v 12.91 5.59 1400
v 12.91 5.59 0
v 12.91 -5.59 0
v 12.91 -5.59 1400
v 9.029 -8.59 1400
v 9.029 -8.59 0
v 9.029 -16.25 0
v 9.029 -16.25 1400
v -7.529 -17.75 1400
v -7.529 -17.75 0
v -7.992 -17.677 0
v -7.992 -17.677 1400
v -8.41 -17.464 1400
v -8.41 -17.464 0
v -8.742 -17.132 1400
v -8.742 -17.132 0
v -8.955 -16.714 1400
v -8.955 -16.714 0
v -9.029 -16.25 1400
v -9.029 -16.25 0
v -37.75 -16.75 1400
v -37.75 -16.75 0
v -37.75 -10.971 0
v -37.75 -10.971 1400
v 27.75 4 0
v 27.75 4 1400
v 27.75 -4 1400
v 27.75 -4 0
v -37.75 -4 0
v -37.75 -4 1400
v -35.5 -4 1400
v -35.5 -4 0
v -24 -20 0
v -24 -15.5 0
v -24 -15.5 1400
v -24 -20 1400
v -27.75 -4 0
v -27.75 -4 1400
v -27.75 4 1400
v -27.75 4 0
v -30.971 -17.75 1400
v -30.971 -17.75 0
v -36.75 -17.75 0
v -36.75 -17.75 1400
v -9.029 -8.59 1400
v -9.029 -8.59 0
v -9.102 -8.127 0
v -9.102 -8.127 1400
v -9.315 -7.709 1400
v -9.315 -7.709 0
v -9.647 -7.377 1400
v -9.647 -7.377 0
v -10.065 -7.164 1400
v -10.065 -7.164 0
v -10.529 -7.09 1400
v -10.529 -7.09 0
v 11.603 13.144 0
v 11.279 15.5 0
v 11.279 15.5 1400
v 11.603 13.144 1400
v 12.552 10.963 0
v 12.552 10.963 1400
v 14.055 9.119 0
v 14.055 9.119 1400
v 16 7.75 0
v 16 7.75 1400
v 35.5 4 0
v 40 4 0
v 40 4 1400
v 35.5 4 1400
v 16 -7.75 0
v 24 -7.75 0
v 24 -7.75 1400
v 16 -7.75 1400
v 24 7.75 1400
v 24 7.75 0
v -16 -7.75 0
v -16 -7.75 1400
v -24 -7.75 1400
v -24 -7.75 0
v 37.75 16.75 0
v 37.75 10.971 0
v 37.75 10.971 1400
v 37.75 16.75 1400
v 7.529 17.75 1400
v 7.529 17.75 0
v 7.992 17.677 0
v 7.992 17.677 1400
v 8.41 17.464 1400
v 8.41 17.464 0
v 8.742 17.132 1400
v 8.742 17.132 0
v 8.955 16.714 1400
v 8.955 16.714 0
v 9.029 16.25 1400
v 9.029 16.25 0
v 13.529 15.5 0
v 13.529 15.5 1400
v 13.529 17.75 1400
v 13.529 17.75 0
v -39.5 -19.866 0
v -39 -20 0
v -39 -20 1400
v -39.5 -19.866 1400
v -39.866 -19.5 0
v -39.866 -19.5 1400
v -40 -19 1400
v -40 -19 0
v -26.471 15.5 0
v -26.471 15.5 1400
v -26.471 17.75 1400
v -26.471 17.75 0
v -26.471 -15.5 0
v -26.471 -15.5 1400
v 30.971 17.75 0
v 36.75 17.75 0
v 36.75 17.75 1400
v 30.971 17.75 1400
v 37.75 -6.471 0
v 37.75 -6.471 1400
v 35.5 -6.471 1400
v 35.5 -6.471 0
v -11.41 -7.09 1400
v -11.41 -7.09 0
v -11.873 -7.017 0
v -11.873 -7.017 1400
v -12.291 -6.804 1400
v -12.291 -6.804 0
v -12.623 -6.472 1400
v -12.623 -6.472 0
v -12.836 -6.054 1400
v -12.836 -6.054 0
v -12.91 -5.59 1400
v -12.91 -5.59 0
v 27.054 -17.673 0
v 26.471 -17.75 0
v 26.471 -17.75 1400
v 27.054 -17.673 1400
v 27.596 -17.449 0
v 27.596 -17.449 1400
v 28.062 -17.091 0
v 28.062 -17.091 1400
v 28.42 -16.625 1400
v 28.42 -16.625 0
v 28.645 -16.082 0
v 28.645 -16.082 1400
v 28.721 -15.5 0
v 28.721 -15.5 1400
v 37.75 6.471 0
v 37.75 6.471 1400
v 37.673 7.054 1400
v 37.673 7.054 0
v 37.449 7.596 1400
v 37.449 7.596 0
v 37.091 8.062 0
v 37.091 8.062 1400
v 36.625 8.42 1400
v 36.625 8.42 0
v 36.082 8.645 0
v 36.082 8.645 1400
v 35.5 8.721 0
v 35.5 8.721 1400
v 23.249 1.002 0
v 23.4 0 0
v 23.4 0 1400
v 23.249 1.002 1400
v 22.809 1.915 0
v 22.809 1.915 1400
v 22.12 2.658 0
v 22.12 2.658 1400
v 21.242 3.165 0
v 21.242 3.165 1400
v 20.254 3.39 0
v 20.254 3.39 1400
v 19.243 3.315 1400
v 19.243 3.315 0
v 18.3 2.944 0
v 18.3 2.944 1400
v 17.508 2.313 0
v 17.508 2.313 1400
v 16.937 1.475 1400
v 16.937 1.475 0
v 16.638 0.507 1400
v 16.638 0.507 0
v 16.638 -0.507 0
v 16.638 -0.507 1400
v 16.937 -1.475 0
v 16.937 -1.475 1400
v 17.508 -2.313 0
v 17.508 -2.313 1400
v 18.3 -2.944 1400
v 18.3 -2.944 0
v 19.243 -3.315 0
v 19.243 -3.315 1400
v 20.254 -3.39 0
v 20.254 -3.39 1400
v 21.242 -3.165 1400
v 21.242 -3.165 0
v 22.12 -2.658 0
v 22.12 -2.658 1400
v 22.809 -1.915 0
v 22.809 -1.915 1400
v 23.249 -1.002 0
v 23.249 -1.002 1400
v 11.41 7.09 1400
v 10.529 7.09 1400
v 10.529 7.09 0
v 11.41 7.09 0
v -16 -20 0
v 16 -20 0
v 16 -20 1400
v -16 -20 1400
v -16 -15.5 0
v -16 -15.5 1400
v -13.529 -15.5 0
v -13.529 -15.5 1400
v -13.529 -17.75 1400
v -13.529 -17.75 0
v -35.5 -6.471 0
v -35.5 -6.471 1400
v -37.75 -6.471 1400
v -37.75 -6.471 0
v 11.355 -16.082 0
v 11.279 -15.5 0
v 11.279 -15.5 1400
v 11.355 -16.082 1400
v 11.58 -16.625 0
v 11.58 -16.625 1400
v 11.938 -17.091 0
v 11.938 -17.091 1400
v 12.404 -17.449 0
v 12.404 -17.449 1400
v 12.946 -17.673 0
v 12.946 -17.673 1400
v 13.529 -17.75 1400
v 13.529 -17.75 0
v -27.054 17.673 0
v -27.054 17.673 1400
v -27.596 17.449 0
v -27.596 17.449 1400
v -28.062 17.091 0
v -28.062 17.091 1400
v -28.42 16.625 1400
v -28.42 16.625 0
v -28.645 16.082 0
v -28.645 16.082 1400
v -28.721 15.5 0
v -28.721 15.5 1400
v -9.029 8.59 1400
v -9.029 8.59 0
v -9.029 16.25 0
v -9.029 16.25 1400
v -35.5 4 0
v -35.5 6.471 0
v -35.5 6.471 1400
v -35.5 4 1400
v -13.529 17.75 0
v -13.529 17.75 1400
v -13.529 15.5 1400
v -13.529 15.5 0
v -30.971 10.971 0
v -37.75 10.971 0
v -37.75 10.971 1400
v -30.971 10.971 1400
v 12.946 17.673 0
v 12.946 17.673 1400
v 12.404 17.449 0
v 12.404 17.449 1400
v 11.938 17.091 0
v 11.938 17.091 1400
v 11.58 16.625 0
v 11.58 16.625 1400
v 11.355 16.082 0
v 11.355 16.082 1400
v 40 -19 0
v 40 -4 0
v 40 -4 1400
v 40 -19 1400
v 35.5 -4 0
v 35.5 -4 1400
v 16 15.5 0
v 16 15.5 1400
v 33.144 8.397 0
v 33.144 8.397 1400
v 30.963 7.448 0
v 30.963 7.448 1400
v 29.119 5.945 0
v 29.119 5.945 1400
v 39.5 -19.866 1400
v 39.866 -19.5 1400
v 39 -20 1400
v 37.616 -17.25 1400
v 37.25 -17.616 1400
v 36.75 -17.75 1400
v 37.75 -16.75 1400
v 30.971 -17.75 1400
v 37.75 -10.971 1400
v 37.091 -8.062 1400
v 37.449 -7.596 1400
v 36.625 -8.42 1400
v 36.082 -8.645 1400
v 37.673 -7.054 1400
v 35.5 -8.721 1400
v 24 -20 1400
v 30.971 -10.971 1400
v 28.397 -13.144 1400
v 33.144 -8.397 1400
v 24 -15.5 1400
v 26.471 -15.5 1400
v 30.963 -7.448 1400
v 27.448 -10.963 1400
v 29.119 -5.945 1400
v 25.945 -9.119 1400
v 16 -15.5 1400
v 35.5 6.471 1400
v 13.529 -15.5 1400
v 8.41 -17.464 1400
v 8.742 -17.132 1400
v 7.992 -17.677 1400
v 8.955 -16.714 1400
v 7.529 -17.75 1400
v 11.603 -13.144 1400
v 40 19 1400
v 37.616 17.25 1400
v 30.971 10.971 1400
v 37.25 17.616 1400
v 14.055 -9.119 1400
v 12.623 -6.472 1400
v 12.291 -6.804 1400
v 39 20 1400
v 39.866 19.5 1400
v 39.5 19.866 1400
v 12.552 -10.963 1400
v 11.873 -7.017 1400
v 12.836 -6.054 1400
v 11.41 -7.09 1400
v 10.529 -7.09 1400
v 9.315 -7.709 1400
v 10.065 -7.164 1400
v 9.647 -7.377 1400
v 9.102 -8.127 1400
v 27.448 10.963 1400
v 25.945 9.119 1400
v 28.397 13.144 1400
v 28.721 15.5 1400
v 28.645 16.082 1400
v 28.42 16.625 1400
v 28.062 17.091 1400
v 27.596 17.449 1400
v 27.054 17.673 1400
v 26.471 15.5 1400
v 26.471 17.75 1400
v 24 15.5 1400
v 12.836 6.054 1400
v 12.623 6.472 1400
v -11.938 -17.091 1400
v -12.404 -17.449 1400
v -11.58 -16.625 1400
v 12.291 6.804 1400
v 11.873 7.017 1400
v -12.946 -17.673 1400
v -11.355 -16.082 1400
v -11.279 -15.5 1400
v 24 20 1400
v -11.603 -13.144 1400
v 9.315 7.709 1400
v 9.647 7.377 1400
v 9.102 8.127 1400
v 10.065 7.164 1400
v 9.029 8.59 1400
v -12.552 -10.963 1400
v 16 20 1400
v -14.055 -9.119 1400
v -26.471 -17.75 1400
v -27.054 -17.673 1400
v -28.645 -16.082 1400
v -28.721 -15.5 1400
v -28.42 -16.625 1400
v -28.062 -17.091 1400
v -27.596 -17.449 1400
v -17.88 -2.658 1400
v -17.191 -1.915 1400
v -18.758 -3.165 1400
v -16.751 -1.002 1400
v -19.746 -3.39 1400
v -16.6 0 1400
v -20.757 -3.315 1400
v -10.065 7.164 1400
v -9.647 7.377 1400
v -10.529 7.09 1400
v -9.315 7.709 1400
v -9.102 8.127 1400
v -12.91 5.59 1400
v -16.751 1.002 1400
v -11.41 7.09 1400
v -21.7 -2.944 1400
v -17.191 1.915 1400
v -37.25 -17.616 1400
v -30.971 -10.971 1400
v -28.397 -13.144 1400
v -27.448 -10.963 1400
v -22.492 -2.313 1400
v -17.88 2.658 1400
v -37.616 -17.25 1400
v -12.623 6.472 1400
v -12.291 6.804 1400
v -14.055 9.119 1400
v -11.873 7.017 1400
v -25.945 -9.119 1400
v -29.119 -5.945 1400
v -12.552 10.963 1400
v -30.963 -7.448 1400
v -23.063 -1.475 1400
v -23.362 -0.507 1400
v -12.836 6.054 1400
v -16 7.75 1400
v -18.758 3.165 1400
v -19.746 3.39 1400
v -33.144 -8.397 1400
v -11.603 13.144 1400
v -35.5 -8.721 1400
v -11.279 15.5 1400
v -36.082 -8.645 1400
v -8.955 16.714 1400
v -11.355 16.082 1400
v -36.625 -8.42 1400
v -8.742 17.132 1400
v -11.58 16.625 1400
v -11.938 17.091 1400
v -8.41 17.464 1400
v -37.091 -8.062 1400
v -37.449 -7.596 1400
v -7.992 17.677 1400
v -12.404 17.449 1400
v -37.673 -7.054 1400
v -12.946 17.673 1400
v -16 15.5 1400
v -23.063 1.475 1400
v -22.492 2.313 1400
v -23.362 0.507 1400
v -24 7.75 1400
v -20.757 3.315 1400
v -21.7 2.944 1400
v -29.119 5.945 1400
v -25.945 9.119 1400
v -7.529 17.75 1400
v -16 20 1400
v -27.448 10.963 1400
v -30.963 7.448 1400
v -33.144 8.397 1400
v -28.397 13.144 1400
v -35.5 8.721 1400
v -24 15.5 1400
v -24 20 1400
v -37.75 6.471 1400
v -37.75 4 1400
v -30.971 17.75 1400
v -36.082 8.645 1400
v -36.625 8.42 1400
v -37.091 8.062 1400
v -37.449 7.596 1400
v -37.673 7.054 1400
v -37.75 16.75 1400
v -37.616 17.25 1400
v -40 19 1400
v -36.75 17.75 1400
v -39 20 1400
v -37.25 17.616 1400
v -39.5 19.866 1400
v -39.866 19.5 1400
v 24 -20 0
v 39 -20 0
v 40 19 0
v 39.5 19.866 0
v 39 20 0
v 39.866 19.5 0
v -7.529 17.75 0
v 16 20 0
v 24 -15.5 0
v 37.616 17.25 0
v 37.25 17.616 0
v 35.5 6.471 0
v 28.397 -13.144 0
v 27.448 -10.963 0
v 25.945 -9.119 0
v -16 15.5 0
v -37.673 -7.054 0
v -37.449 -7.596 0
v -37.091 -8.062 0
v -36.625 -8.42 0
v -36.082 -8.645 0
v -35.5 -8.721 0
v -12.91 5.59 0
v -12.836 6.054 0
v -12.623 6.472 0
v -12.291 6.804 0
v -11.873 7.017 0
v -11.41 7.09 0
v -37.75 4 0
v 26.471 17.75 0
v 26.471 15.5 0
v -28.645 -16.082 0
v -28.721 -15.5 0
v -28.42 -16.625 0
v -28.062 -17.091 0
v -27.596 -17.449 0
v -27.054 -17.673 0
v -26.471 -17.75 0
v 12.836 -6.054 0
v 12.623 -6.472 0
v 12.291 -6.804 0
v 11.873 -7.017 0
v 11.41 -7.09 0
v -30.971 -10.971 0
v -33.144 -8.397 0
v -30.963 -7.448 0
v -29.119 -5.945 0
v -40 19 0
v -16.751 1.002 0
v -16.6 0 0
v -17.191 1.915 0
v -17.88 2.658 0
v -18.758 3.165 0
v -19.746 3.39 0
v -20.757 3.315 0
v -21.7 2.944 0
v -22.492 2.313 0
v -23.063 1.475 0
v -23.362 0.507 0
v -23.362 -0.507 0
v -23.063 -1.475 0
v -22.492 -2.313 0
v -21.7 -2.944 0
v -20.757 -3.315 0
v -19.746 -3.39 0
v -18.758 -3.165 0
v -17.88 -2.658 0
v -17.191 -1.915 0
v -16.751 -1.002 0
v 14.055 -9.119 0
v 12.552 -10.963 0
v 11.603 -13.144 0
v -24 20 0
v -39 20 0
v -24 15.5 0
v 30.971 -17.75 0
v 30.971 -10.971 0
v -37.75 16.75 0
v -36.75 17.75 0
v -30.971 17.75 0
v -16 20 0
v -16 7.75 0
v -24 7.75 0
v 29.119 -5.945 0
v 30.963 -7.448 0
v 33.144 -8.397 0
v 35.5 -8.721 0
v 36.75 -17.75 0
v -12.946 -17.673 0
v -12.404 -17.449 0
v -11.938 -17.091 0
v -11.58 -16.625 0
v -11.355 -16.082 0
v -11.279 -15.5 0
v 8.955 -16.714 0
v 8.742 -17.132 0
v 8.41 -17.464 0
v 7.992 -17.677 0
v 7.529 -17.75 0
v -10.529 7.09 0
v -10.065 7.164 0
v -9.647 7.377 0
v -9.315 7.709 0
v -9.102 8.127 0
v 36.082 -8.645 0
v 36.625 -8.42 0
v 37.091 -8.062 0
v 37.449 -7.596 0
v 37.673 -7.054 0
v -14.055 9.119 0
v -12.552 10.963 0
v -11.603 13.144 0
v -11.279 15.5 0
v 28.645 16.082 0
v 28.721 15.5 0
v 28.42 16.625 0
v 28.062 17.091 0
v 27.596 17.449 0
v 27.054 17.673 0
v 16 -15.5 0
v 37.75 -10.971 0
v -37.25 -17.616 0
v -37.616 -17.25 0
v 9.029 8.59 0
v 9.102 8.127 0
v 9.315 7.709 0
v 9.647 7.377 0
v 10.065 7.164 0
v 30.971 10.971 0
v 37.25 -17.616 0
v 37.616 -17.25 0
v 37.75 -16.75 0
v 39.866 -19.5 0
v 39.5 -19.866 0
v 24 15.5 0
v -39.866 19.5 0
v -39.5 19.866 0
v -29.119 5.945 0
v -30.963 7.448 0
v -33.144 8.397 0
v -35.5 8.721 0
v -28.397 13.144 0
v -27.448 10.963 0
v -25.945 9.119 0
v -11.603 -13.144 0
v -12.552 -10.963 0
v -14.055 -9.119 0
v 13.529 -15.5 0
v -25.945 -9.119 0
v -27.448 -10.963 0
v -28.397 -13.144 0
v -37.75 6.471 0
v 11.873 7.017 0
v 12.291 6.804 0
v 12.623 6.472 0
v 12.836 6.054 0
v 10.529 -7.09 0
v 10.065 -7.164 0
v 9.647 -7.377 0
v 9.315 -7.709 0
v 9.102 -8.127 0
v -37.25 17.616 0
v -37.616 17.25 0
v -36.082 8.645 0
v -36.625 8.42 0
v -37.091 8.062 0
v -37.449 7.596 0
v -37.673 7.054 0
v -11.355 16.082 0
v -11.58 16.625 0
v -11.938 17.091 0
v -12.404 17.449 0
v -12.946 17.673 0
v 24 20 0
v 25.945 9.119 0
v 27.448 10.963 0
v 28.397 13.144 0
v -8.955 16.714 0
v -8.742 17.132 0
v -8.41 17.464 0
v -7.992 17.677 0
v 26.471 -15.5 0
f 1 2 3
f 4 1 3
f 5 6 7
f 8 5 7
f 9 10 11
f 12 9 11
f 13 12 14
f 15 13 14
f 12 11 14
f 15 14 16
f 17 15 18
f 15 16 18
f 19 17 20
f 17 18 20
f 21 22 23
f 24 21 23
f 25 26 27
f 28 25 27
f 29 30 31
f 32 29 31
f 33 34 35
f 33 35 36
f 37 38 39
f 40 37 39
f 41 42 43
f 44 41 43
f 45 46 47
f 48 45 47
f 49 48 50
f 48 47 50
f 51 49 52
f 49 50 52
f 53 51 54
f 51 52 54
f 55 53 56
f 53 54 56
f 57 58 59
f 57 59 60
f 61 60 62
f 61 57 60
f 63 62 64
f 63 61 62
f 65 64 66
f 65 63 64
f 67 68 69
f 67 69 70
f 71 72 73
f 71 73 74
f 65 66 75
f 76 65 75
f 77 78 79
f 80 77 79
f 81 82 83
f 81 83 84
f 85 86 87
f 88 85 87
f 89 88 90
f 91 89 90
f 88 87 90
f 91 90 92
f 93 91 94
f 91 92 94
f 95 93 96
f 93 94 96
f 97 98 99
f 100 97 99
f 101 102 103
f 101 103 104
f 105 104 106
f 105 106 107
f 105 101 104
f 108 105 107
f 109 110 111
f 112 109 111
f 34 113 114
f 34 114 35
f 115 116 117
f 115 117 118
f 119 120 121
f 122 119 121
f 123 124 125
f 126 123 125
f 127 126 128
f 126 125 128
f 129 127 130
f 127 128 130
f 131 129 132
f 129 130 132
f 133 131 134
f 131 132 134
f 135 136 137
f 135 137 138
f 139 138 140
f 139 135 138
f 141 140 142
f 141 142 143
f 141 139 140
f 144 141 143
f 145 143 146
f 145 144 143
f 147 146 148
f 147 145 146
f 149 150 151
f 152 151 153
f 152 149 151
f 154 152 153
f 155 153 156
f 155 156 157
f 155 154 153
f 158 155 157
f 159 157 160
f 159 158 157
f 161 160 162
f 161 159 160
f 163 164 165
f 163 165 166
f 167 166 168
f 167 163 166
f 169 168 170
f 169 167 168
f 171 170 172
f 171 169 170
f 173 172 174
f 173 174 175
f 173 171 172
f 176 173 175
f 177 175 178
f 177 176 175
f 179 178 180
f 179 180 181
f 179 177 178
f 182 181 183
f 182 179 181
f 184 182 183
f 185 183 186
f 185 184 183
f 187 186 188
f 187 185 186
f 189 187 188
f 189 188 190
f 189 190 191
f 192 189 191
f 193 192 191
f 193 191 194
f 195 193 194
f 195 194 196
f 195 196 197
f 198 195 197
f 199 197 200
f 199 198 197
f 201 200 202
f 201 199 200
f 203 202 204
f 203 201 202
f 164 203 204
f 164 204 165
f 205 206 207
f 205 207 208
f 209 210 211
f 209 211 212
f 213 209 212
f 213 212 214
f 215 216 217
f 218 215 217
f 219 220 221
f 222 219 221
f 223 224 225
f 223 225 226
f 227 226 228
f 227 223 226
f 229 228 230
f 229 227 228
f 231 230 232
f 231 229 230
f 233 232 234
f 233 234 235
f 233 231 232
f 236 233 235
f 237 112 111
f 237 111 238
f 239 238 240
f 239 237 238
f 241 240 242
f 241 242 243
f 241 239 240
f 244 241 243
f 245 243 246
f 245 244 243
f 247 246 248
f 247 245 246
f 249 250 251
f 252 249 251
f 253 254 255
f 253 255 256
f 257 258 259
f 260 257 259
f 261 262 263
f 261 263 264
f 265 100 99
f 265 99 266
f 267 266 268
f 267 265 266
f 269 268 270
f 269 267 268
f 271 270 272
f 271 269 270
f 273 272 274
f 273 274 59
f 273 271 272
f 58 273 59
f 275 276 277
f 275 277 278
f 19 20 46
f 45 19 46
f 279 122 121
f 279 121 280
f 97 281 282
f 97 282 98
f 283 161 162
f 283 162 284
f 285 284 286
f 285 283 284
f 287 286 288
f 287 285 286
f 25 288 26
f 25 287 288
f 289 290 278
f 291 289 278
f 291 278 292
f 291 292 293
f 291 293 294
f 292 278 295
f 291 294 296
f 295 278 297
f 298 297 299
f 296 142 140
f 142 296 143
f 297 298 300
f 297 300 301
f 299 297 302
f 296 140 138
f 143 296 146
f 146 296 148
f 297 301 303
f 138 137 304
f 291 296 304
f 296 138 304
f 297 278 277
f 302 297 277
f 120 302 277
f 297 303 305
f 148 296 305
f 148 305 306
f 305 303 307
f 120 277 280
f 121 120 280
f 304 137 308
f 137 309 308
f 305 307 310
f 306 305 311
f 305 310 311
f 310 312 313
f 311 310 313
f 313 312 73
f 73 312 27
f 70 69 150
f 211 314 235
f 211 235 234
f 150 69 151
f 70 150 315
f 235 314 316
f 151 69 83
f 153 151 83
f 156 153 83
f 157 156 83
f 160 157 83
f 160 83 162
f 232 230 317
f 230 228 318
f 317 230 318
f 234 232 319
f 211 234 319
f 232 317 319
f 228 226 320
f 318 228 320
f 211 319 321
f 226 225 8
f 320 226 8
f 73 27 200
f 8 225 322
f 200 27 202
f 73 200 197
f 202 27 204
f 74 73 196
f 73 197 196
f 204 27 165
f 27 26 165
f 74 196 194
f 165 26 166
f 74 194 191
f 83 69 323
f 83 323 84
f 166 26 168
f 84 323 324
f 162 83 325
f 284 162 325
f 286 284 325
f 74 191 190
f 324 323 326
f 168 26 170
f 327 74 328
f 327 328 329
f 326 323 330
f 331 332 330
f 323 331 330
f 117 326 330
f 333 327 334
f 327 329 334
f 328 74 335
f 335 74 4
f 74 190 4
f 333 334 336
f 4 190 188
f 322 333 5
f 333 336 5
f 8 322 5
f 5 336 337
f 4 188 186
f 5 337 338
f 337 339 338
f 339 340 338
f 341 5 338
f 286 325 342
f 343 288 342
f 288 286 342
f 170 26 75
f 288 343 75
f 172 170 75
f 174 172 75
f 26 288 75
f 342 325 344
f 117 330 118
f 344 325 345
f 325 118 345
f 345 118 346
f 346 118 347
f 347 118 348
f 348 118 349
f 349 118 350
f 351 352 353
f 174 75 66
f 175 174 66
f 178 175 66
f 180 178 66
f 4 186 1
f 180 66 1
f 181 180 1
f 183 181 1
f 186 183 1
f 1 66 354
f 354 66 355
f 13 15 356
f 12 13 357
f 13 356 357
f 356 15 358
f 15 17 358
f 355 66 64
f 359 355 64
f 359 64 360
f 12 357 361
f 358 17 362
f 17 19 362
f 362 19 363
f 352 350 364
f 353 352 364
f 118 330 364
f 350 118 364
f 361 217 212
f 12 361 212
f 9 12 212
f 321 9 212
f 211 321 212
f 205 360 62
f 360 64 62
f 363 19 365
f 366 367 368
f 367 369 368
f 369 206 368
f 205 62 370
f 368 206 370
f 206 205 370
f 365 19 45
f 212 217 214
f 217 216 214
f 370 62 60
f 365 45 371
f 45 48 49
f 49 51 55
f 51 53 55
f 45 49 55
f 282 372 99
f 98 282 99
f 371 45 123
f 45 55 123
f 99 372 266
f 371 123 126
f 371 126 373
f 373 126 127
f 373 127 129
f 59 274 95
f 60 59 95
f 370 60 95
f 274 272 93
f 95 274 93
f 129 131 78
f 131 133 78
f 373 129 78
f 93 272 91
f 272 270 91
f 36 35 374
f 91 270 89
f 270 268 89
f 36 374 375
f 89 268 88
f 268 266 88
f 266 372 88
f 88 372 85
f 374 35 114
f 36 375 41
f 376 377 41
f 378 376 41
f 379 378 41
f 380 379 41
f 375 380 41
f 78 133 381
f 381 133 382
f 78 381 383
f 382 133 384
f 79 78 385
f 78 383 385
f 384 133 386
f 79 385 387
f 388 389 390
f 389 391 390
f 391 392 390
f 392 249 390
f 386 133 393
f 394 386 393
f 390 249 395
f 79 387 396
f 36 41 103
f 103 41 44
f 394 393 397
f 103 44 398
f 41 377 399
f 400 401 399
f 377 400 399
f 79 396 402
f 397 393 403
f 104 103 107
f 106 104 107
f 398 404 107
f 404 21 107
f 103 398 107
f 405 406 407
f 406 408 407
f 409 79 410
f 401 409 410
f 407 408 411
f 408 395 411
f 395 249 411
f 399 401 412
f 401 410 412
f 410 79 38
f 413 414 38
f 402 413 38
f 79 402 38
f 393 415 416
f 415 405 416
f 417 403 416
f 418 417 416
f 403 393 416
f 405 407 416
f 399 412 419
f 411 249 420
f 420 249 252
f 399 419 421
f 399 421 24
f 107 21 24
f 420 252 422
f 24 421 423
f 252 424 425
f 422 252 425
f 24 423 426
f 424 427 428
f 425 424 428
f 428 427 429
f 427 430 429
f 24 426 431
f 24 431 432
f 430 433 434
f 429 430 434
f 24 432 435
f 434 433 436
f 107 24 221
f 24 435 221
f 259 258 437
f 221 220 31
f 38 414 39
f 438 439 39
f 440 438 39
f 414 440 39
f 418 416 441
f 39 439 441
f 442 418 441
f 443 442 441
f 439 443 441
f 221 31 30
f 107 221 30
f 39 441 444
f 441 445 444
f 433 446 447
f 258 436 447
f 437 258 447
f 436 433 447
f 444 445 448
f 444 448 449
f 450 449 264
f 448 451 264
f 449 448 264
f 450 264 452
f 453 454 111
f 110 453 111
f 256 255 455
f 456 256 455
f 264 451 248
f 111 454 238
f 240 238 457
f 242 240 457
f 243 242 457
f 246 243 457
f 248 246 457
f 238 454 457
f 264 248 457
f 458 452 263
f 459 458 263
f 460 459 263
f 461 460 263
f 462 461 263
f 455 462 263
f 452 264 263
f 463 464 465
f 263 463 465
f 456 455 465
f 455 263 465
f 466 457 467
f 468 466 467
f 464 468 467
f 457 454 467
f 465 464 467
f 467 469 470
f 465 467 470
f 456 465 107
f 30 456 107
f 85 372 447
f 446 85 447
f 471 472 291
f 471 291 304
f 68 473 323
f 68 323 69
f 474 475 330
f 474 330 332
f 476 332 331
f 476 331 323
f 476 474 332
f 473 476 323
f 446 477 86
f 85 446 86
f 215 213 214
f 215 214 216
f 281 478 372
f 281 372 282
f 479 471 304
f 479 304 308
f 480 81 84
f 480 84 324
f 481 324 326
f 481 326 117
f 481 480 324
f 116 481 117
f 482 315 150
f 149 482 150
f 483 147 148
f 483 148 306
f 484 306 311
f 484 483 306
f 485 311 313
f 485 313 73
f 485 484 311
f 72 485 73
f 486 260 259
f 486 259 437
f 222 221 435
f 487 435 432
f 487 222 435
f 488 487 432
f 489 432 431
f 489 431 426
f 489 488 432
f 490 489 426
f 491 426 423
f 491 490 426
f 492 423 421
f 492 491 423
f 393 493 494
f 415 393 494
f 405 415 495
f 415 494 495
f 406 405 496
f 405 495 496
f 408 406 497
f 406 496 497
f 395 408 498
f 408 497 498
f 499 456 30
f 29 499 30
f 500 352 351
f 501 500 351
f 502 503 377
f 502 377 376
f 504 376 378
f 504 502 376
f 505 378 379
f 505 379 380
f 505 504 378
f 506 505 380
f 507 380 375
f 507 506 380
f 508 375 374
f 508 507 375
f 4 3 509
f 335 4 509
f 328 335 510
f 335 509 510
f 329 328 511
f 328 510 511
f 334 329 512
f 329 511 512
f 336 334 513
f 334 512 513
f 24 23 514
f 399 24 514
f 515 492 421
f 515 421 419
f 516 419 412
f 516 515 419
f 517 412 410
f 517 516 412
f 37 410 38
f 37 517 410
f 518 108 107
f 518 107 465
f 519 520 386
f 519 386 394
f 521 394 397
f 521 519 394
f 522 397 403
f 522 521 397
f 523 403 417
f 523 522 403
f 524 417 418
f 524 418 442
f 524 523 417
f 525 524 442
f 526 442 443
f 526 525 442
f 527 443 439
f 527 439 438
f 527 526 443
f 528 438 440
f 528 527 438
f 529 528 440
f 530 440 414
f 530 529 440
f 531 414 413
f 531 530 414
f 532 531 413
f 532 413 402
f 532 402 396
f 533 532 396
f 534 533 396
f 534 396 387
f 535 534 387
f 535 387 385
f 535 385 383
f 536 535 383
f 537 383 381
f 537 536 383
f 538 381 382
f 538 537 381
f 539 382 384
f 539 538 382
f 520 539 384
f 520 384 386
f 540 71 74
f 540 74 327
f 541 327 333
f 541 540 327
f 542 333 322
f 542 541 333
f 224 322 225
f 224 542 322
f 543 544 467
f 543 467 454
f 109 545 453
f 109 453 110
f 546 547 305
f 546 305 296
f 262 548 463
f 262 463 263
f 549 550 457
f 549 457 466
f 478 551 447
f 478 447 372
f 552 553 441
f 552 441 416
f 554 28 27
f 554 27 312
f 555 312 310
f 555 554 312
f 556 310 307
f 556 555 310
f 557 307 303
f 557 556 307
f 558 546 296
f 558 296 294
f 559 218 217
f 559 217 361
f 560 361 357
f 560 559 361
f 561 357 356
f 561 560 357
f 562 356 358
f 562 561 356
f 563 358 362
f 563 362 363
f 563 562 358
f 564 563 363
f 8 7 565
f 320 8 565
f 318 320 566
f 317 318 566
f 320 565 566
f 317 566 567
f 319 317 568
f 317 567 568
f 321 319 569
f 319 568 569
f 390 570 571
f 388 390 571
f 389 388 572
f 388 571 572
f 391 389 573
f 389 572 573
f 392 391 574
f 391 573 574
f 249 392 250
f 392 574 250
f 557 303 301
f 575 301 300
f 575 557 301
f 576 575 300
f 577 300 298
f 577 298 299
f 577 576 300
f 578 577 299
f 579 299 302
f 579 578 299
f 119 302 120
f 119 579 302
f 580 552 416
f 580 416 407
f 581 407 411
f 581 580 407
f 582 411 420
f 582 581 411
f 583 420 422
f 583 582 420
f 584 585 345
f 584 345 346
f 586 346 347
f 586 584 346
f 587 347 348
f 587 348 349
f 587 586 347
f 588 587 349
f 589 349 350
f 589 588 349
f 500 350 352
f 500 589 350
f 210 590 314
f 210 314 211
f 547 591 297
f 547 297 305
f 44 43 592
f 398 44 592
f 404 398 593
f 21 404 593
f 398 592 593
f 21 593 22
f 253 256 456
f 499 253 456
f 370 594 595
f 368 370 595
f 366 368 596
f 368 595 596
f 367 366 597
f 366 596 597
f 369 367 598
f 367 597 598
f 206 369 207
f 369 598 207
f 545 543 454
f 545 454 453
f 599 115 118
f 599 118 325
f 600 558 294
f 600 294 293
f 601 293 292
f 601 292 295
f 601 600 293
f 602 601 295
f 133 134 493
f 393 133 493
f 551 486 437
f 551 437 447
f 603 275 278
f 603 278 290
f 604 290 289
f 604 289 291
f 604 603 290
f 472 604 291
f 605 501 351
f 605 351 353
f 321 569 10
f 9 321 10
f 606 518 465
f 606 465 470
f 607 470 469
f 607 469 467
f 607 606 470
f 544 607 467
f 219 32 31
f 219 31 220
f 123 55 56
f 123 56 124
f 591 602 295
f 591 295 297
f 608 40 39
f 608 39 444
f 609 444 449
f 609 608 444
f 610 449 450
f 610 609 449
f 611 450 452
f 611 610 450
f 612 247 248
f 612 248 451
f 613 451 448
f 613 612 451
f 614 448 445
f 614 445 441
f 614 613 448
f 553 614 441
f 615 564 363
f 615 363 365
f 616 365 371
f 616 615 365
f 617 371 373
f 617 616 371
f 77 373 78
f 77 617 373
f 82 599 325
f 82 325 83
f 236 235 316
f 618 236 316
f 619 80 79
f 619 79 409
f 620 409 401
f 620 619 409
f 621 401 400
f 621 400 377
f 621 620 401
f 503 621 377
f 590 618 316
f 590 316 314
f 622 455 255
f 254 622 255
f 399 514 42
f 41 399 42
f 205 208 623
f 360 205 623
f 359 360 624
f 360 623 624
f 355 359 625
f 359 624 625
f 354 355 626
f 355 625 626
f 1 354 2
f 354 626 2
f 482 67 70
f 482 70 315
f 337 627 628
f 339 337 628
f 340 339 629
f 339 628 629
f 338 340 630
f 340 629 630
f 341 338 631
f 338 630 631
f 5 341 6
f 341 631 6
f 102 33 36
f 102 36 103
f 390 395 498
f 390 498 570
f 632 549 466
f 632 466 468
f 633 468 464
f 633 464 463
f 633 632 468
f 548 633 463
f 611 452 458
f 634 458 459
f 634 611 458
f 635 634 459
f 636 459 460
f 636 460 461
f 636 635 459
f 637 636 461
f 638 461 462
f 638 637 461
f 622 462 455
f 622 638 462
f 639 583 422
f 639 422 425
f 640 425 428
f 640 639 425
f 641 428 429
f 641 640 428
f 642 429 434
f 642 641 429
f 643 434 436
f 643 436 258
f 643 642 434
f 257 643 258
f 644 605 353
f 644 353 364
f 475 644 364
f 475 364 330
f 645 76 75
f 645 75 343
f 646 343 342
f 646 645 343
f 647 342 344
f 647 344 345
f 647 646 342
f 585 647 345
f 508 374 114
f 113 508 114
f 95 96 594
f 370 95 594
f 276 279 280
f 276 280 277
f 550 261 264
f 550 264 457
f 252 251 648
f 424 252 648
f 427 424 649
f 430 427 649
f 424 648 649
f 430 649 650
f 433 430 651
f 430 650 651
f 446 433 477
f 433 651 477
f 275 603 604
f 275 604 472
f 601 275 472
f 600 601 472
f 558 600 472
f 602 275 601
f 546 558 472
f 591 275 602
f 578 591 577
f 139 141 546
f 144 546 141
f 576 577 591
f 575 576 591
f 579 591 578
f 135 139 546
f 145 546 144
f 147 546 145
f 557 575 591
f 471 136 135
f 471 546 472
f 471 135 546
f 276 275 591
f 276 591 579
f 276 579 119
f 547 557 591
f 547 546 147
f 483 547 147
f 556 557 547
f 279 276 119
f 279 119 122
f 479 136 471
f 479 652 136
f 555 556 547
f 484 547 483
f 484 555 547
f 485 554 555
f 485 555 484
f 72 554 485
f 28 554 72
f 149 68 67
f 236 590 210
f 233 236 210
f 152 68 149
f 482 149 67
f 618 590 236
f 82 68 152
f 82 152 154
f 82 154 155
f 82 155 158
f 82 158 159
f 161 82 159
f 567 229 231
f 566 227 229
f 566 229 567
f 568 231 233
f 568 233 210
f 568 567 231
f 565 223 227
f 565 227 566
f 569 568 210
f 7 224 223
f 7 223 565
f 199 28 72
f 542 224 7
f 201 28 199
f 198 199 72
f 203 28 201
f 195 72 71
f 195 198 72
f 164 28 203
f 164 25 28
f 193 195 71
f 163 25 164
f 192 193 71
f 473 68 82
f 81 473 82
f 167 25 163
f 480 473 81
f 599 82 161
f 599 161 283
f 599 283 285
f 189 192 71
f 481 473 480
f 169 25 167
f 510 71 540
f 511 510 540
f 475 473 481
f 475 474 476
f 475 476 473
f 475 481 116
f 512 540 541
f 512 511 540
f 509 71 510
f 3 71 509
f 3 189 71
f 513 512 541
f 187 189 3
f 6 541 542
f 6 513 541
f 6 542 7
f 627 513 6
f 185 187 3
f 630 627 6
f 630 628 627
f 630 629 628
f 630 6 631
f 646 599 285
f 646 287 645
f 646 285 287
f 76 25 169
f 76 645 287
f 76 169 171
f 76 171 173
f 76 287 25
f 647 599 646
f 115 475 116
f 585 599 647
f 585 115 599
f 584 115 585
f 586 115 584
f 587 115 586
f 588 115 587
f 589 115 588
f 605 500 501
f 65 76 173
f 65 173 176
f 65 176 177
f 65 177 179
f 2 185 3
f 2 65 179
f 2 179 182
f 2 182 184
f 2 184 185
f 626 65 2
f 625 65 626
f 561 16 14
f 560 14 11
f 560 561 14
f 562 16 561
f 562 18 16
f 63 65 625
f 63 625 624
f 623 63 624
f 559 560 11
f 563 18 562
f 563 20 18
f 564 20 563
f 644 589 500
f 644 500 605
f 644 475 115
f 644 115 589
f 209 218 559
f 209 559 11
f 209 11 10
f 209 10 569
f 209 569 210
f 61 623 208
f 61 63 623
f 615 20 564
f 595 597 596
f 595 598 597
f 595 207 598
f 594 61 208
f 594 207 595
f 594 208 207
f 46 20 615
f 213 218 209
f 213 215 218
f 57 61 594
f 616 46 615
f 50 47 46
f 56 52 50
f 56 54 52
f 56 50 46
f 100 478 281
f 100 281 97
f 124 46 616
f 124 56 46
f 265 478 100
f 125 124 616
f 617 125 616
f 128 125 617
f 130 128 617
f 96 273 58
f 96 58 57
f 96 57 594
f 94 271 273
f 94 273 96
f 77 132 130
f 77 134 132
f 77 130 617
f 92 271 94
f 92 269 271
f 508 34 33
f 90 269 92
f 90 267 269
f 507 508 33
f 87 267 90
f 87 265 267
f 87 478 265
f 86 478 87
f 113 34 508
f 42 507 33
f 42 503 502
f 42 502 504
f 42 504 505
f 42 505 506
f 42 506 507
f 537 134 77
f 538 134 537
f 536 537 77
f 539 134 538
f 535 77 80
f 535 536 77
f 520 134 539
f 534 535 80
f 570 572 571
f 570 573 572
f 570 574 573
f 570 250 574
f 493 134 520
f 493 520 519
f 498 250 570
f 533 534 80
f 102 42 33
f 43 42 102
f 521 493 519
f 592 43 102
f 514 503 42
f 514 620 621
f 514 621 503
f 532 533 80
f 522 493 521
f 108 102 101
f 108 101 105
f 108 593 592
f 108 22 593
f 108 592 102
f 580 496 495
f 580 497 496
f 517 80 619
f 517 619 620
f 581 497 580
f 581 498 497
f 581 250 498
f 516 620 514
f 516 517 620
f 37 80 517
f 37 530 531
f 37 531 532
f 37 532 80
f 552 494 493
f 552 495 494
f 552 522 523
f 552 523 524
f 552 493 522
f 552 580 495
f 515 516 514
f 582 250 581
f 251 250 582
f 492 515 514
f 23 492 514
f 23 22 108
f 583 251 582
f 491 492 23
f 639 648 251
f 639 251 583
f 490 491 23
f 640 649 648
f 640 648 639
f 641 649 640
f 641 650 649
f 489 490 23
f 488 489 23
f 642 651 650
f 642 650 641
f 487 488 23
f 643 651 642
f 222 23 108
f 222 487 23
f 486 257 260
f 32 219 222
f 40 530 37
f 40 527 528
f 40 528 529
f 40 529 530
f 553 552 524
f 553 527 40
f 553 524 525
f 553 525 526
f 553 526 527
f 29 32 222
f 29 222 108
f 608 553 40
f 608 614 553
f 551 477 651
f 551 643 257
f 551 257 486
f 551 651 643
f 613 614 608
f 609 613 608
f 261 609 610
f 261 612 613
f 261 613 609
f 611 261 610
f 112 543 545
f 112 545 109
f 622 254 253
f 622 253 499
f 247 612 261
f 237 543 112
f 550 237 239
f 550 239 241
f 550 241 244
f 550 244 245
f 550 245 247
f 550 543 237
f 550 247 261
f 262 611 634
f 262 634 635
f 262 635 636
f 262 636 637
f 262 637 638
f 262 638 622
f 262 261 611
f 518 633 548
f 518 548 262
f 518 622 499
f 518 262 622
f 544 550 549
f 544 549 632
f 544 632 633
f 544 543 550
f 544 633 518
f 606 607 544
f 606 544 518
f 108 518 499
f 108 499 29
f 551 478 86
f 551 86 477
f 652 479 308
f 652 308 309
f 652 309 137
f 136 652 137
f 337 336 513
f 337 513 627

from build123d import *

# Parameters (mm, degrees)
SZKIC1_R                    = 3.4
DODANIE_WYCI_GNI_CIE1_DEPTH = 1400


with BuildPart() as part:
    # Szkic1 → Dodanie-wyciągnięcie1 (new body)
    with BuildSketch(Plane.XY):
        with BuildLine():
            Line((-40, -19), (-40, 19))
            ThreePointArc((-40, 19), (-39.707106781, 19.707106781), (-39, 20))
            Line((-39, 20), (-24, 20))
            Line((-24, 20), (-24, 15.5))
            Line((-24, 15.5), (-26.471381771, 15.5))
            Line((-26.471381771, 15.5), (-26.471381771, 17.75))
            ThreePointArc((-26.471381771, 17.75), (-28.062372029, 17.090990258), (-28.721381771, 15.5))
            ThreePointArc((-28.721381771, 15.5), (-27.448087912, 10.962546258), (-24, 7.75))
            Line((-24, 7.75), (-16, 7.75))
            ThreePointArc((-16, 7.75), (-12.551912088, 10.962546258), (-11.278618229, 15.5))
            ThreePointArc((-11.278618229, 15.5), (-11.937627971, 17.090990258), (-13.528618229, 17.75))
            Line((-13.528618229, 17.75), (-13.528618229, 15.5))
            Line((-13.528618229, 15.5), (-16, 15.5))
            Line((-16, 15.5), (-16, 20))
            Line((-16, 20), (13.528618229, 20))
            Line((13.528618229, 20), (16, 20))
            Line((16, 20), (16, 15.5))
            Line((16, 15.5), (13.528618229, 15.5))
            Line((13.528618229, 15.5), (13.528618229, 17.75))
            ThreePointArc((13.528618229, 17.75), (11.937627971, 17.090990258), (11.278618229, 15.5))
            ThreePointArc((11.278618229, 15.5), (12.551912088, 10.962546258), (16, 7.75))
            Line((16, 7.75), (24, 7.75))
            ThreePointArc((24, 7.75), (27.448087912, 10.962546258), (28.721381771, 15.5))
            ThreePointArc((28.721381771, 15.5), (28.062372029, 17.090990258), (26.471381771, 17.75))
            Line((26.471381771, 17.75), (26.471381771, 15.5))
            Line((26.471381771, 15.5), (24, 15.5))
            Line((24, 15.5), (24, 20))
            Line((24, 20), (39, 20))
            ThreePointArc((39, 20), (39.707106781, 19.707106781), (40, 19))
            Line((40, 19), (40, 4))
            Line((40, 4), (35.5, 4))
            Line((35.5, 4), (35.5, 6.471381771))
            Line((35.5, 6.471381771), (37.75, 6.471381771))
            ThreePointArc((37.75, 6.471381771), (37.090990258, 8.062372029), (35.5, 8.721381771))
            ThreePointArc((35.5, 8.721381771), (30.962546258, 7.448087912), (27.75, 4))
            Line((27.75, 4), (27.75, -4))
            ThreePointArc((27.75, -4), (30.962546258, -7.448087912), (35.5, -8.721381771))
            ThreePointArc((35.5, -8.721381771), (37.090990258, -8.062372029), (37.75, -6.471381771))
            Line((37.75, -6.471381771), (35.5, -6.471381771))
            Line((35.5, -6.471381771), (35.5, -4))
            Line((35.5, -4), (40, -4))
            Line((40, -4), (40, -19))
            ThreePointArc((40, -19), (39.707106781, -19.707106781), (39, -20))
            Line((39, -20), (24, -20))
            Line((24, -20), (24, -15.5))
            Line((24, -15.5), (26.471381771, -15.5))
            Line((26.471381771, -15.5), (26.471381771, -17.75))
            ThreePointArc((26.471381771, -17.75), (28.062372029, -17.090990258), (28.721381771, -15.5))
            ThreePointArc((28.721381771, -15.5), (27.448087912, -10.962546258), (24, -7.75))
            Line((24, -7.75), (16, -7.75))
            ThreePointArc((16, -7.75), (12.551912088, -10.962546258), (11.278618229, -15.5))
            ThreePointArc((11.278618229, -15.5), (11.937627971, -17.090990258), (13.528618229, -17.75))
            Line((13.528618229, -17.75), (13.528618229, -15.5))
            Line((13.528618229, -15.5), (16, -15.5))
            Line((16, -15.5), (16, -20))
            Line((16, -20), (-16, -20))
            Line((-16, -20), (-16, -15.5))
            Line((-16, -15.5), (-13.528618229, -15.5))
            Line((-13.528618229, -15.5), (-13.528618229, -17.75))
            ThreePointArc((-13.528618229, -17.75), (-11.937627971, -17.090990258), (-11.278618229, -15.5))
            ThreePointArc((-11.278618229, -15.5), (-12.551912088, -10.962546258), (-16, -7.75))
            Line((-16, -7.75), (-24, -7.75))
            ThreePointArc((-24, -7.75), (-27.448087912, -10.962546258), (-28.721381771, -15.5))
            ThreePointArc((-28.721381771, -15.5), (-28.062372029, -17.090990258), (-26.471381771, -17.75))
            Line((-26.471381771, -17.75), (-26.471381771, -15.5))
            Line((-26.471381771, -15.5), (-24, -15.5))
            Line((-24, -15.5), (-24, -20))
            Line((-24, -20), (-39, -20))
            ThreePointArc((-39, -20), (-39.707106781, -19.707106781), (-40, -19))
        make_face()
        with Locations((-20, 0)):
            Circle(SZKIC1_R, mode=Mode.SUBTRACT)
        with Locations((20, 0)):
            Circle(SZKIC1_R, mode=Mode.SUBTRACT)
        with BuildLine():
            Line((30.971381771, -17.75), (36.75, -17.75))
            ThreePointArc((36.75, -17.75), (37.457106781, -17.457106781), (37.75, -16.75))
            Line((37.75, -16.75), (37.75, -10.971381771))
            Line((37.75, -10.971381771), (30.971381771, -10.971381771))
            Line((30.971381771, -10.971381771), (30.971381771, -17.75))
        make_face(mode=Mode.SUBTRACT)
        with BuildLine():
            Line((-35.5, -6.471381771), (-37.75, -6.471381771))
            ThreePointArc((-37.75, -6.471381771), (-37.090990258, -8.062372029), (-35.5, -8.721381771))
            ThreePointArc((-35.5, -8.721381771), (-30.962546258, -7.448087912), (-27.75, -4))
            Line((-27.75, -4), (-27.75, 4))
            ThreePointArc((-27.75, 4), (-30.962546258, 7.448087912), (-35.5, 8.721381771))
            ThreePointArc((-35.5, 8.721381771), (-37.090990258, 8.062372029), (-37.75, 6.471381771))
            Line((-37.75, 6.471381771), (-35.5, 6.471381771))
            Line((-35.5, 6.471381771), (-35.5, 4))
            Line((-35.5, 4), (-37.75, 4))
            Line((-37.75, 4), (-37.75, -4))
            Line((-37.75, -4), (-35.5, -4))
            Line((-35.5, -4), (-35.5, -6.471381771))
        make_face(mode=Mode.SUBTRACT)
        with BuildLine():
            Line((10.528618229, 7.090188806), (11.40950808, 7.090188806))
            ThreePointArc((11.40950808, 7.090188806), (12.470168251, 6.650848977), (12.90950808, 5.590188806))
            Line((12.90950808, 5.590188806), (12.90950808, -5.590188806))
            ThreePointArc((12.90950808, -5.590188806), (12.470168251, -6.650848977), (11.40950808, -7.090188806))
            Line((11.40950808, -7.090188806), (10.528618229, -7.090188806))
            ThreePointArc((10.528618229, -7.090188806), (9.467958057, -7.529528634), (9.028618229, -8.590188806))
            Line((9.028618229, -8.590188806), (9.028618229, -16.25))
            ThreePointArc((9.028618229, -16.25), (8.589278401, -17.310660172), (7.528618229, -17.75))
            Line((7.528618229, -17.75), (-7.528618229, -17.75))
            ThreePointArc((-7.528618229, -17.75), (-8.589278401, -17.310660172), (-9.028618229, -16.25))
            Line((-9.028618229, -16.25), (-9.028618229, -8.590188806))
            ThreePointArc((-9.028618229, -8.590188806), (-9.467958057, -7.529528634), (-10.528618229, -7.090188806))
            Line((-10.528618229, -7.090188806), (-11.40950808, -7.090188806))
            ThreePointArc((-11.40950808, -7.090188806), (-12.470168251, -6.650848977), (-12.90950808, -5.590188806))
            Line((-12.90950808, -5.590188806), (-12.90950808, 5.590188806))
            ThreePointArc((-12.90950808, 5.590188806), (-12.470168251, 6.650848977), (-11.40950808, 7.090188806))
            Line((-11.40950808, 7.090188806), (-10.528618229, 7.090188806))
            ThreePointArc((-10.528618229, 7.090188806), (-9.467958057, 7.529528634), (-9.028618229, 8.590188806))
            Line((-9.028618229, 8.590188806), (-9.028618229, 16.25))
            ThreePointArc((-9.028618229, 16.25), (-8.589278401, 17.310660172), (-7.528618229, 17.75))
            Line((-7.528618229, 17.75), (7.528618229, 17.75))
            ThreePointArc((7.528618229, 17.75), (8.589278401, 17.310660172), (9.028618229, 16.25))
            Line((9.028618229, 16.25), (9.028618229, 8.590188806))
            ThreePointArc((9.028618229, 8.590188806), (9.467958057, 7.529528634), (10.528618229, 7.090188806))
        make_face(mode=Mode.SUBTRACT)
        with BuildLine():
            Line((30.971381771, 10.971381771), (37.75, 10.971381771))
            Line((37.75, 10.971381771), (37.75, 16.75))
            ThreePointArc((37.75, 16.75), (37.457106781, 17.457106781), (36.75, 17.75))
            Line((36.75, 17.75), (30.971381771, 17.75))
            Line((30.971381771, 17.75), (30.971381771, 10.971381771))
        make_face(mode=Mode.SUBTRACT)
        with BuildLine():
            Line((-30.971381771, -10.971381771), (-30.971381771, -17.75))
            Line((-30.971381771, -17.75), (-36.75, -17.75))
            ThreePointArc((-36.75, -17.75), (-37.457106781, -17.457106781), (-37.75, -16.75))
            Line((-37.75, -16.75), (-37.75, -10.971381771))
            Line((-37.75, -10.971381771), (-30.971381771, -10.971381771))
        make_face(mode=Mode.SUBTRACT)
        with BuildLine():
            Line((-30.971381771, 17.75), (-36.75, 17.75))
            ThreePointArc((-36.75, 17.75), (-37.457106781, 17.457106781), (-37.75, 16.75))
            Line((-37.75, 16.75), (-37.75, 10.971381771))
            Line((-37.75, 10.971381771), (-30.971381771, 10.971381771))
            Line((-30.971381771, 10.971381771), (-30.971381771, 17.75))
        make_face(mode=Mode.SUBTRACT)
    extrude(amount=DODANIE_WYCI_GNI_CIE1_DEPTH)


solid = part.part
